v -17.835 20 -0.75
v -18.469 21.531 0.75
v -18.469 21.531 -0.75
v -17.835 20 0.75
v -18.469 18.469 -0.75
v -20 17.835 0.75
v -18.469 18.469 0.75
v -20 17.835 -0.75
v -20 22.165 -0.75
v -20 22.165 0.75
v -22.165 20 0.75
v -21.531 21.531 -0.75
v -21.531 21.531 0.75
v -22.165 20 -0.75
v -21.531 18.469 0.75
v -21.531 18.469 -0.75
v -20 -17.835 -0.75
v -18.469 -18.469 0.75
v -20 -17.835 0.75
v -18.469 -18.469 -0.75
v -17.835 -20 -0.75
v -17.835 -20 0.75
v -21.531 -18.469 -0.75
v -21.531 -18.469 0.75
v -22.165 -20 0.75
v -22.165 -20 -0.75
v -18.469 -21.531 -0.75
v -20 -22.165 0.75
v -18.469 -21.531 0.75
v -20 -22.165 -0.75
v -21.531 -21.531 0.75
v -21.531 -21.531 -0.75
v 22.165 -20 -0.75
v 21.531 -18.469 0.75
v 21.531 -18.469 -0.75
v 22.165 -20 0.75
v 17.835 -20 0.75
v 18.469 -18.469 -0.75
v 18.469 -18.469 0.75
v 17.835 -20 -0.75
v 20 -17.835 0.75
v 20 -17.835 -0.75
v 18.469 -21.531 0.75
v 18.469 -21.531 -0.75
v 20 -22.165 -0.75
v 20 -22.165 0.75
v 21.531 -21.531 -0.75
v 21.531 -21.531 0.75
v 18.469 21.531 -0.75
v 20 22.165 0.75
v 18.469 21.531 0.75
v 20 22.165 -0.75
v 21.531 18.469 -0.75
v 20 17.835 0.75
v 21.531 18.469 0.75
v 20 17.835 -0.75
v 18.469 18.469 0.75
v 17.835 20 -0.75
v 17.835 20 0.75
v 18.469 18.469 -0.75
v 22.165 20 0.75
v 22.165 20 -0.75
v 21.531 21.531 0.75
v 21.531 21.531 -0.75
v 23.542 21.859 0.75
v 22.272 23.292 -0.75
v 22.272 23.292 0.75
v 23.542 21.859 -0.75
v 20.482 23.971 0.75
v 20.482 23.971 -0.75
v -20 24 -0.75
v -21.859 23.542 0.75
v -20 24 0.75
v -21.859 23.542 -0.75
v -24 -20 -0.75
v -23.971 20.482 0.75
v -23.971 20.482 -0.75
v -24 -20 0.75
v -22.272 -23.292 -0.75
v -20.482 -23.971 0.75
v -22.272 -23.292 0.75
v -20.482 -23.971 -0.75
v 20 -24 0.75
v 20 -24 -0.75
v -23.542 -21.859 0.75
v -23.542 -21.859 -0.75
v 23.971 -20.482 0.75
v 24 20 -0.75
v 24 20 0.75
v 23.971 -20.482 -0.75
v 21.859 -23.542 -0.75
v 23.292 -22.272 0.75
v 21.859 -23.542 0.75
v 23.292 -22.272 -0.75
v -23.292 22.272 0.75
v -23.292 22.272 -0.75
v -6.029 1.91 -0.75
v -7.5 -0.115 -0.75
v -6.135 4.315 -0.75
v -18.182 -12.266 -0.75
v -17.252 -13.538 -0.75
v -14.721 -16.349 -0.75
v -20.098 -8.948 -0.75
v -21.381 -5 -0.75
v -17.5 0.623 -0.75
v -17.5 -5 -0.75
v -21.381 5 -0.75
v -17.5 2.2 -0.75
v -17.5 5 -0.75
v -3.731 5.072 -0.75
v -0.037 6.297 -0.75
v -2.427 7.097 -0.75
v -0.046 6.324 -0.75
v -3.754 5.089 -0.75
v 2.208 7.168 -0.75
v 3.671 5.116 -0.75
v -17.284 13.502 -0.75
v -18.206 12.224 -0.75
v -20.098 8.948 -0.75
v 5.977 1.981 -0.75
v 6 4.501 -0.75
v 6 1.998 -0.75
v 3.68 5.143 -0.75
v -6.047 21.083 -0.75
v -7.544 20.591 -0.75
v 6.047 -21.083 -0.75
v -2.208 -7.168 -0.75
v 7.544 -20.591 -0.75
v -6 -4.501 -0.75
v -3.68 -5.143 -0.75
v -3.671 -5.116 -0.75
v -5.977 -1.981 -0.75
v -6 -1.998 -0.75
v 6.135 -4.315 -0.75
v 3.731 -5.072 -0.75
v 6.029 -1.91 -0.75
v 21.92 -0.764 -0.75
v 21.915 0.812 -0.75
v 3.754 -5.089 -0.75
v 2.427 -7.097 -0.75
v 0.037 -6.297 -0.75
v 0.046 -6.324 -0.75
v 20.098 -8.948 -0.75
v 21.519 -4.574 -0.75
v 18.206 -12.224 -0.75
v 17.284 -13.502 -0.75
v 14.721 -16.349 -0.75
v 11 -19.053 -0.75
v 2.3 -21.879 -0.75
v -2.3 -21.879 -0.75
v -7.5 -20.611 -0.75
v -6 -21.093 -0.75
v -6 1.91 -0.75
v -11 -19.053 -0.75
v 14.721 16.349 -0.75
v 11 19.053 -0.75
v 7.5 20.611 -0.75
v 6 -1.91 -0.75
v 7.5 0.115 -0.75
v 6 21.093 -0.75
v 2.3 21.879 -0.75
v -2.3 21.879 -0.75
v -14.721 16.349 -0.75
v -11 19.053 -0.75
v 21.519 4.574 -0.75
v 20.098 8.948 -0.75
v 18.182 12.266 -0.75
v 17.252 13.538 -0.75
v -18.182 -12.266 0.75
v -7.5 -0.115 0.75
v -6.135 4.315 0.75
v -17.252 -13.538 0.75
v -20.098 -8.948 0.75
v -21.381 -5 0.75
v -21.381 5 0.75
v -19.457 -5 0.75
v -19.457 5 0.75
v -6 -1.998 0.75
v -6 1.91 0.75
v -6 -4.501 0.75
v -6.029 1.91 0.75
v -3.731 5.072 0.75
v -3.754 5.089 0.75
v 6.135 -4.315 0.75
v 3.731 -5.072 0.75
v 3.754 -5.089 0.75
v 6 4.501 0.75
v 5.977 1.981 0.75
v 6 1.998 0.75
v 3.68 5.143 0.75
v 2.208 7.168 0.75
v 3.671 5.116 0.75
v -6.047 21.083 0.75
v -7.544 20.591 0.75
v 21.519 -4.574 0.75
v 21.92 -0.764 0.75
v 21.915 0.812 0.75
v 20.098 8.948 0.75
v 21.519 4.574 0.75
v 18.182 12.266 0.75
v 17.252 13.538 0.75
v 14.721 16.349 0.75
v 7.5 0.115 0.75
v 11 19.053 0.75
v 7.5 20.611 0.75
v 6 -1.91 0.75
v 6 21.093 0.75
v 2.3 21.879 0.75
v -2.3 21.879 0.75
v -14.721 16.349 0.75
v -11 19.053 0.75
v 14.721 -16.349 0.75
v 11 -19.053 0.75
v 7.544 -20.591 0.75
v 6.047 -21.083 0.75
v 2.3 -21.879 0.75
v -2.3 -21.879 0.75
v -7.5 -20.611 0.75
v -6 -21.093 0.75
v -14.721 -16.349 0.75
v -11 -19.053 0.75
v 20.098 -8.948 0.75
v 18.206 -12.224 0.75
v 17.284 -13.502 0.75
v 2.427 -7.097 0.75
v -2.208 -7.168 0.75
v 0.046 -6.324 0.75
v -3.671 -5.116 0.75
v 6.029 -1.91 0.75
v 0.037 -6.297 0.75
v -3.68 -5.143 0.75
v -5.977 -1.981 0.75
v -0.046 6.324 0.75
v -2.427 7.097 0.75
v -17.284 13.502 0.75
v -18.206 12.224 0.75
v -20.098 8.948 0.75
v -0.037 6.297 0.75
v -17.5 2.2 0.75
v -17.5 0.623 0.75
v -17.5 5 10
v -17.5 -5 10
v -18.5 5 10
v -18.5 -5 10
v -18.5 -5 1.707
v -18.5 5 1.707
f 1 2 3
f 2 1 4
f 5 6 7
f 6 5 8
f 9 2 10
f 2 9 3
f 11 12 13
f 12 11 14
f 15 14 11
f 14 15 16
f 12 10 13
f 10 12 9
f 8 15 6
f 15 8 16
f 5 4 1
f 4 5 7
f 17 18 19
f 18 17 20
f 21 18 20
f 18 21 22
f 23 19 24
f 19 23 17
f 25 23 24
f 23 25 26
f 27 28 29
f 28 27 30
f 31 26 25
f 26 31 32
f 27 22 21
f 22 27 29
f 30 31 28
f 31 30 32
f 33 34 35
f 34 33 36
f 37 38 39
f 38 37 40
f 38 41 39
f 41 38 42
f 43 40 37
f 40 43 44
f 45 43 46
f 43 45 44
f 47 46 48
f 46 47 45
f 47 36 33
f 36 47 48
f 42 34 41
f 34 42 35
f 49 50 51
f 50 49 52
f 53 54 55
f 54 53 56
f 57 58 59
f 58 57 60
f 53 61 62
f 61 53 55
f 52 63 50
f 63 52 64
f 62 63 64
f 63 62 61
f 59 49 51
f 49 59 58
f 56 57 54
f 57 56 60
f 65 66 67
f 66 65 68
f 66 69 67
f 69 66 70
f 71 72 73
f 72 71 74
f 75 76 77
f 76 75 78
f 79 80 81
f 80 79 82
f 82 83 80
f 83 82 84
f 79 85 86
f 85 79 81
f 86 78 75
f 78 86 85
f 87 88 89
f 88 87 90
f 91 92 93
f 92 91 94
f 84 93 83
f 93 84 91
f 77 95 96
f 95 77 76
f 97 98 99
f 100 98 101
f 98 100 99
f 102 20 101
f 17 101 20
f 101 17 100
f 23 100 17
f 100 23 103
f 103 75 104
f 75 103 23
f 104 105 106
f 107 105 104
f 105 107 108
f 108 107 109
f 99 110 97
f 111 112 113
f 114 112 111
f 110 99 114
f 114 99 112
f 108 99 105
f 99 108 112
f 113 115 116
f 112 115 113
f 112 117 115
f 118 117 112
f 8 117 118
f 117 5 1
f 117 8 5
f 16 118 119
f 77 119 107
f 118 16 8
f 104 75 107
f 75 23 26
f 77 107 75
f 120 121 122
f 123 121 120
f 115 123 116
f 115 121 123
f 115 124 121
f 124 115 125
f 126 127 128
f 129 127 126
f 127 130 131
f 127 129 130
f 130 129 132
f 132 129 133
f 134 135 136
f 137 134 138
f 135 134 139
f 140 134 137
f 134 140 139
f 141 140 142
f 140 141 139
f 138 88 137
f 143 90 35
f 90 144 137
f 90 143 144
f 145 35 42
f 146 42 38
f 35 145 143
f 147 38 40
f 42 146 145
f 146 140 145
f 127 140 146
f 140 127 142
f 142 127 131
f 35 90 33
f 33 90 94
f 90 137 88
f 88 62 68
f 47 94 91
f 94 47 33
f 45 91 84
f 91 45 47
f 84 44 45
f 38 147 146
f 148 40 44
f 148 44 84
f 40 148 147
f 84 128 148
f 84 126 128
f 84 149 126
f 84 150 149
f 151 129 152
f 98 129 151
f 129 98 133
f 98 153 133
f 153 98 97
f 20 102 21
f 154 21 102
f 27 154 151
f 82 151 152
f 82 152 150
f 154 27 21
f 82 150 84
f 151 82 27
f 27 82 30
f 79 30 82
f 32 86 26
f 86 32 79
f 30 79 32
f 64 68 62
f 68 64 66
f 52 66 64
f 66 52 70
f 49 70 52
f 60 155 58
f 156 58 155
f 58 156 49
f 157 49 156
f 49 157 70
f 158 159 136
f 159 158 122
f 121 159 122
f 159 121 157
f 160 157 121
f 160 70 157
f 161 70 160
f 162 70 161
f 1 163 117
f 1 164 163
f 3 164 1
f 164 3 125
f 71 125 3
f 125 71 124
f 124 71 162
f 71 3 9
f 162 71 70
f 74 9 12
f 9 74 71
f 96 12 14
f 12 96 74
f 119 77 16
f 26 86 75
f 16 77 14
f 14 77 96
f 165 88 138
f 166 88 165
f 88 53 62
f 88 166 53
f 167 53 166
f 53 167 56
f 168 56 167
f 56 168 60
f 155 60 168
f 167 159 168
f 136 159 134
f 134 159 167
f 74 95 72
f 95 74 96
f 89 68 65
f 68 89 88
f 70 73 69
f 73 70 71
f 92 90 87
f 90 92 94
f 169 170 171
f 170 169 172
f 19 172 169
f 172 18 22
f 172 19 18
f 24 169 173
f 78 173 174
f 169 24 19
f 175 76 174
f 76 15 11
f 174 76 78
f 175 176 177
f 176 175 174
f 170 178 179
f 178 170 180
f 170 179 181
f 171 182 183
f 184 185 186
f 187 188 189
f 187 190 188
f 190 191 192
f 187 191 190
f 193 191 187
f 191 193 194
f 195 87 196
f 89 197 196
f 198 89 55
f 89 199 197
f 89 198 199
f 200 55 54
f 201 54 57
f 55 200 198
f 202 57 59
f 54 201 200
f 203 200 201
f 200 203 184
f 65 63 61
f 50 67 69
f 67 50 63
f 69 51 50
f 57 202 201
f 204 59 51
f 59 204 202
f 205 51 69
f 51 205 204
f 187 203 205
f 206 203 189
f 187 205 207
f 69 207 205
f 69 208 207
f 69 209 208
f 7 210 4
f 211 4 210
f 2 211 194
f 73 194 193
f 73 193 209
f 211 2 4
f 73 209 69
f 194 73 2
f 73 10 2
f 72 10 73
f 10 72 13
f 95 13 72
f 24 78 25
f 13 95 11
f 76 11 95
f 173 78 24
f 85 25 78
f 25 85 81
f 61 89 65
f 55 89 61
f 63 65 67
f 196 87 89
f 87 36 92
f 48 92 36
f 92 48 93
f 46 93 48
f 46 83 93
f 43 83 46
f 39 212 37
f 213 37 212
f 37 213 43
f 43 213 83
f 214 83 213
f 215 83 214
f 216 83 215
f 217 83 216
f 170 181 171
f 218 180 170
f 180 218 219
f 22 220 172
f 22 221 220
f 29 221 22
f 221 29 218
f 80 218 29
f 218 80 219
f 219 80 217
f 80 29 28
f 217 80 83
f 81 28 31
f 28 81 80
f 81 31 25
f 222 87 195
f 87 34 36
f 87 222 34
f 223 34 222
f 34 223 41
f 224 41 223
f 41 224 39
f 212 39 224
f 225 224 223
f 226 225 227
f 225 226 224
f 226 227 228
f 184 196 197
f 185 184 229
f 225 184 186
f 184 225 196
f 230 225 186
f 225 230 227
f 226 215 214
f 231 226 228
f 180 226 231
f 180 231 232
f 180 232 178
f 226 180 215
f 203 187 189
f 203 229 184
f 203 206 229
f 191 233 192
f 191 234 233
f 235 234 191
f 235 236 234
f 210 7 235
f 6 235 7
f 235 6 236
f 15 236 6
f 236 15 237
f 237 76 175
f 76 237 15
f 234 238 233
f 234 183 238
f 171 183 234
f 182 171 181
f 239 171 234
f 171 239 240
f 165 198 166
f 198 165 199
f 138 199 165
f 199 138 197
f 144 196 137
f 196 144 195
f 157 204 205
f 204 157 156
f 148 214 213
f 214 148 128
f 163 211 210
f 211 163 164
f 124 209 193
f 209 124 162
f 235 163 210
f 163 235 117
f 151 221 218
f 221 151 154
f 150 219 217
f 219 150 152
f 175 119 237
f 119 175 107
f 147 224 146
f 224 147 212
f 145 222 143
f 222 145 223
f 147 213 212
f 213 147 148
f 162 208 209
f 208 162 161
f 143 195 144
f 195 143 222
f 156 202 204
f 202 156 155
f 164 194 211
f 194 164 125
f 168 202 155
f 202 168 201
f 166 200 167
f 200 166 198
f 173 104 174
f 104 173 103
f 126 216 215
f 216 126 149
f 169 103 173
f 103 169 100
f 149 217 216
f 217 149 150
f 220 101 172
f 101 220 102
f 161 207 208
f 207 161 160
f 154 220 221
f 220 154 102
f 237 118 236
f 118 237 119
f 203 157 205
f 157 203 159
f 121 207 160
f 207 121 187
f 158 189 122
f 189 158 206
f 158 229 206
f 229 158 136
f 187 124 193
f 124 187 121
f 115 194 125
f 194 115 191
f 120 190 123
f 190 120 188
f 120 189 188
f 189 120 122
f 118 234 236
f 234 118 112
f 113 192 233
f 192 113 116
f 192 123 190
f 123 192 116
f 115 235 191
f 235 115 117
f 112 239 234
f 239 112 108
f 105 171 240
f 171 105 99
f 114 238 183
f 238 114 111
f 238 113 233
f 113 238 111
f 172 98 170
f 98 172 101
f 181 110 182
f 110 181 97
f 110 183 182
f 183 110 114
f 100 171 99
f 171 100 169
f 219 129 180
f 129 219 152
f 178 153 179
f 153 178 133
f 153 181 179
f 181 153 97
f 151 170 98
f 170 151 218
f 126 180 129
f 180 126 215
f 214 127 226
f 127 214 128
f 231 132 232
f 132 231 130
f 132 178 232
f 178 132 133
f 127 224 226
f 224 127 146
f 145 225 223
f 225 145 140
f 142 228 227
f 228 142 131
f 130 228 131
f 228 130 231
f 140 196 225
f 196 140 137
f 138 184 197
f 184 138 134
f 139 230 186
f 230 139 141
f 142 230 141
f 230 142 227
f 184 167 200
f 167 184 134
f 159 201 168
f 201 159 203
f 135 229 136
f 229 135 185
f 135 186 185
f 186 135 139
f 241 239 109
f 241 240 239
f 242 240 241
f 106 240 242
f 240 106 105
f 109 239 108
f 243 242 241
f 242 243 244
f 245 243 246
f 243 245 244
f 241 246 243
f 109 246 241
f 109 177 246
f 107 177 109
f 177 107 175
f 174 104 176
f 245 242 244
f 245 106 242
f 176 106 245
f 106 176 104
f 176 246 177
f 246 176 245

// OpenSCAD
// file: config.scad
// modules
module_body_size = [25, 50, 10];
module_mount_edge_offset = 5;
module_level_bolt_size = 4;
module_level_spring_diameter = 8;
module_level_bolt_spacing = module_body_size[1] - 2*module_mount_edge_offset;
module_clamp_bolt_size = 4;
module_clamp_bolt_head_height = 2.5;

// main body
body_wall_thickness = 5;
body_size = [3*module_body_size[0]+2*body_wall_thickness+1, module_body_size[1]+2*body_wall_thickness+1, 55];
carriage_mount_hole_spacing=22.5;	// i3 rework standard
carriage_screw_size = 4;
carriage_screw_head_height = 2.5;
hotend_fan_output = 49;
hotend_fan_screw_spacing = 40;
hotend_fan_screw_size = 4;
blower_screw_spacing = 40;
blower_screw_size = 4;

// misc
body_chamfer = 2;
layer_height = 0.3;
tolerance = 0.1;
pf = 0.1;  // preview fix for z-buffer tearing on cuts
// main file
use <MCAD/polyholes.scad>
include <config.scad>

thickness = 1.5;
flag_size = [1, 10, 10];
flag_y_offset_from_x_carriage = 12.5;
spines=10;
spine_offset=6;
spine_rotation=0;
size = blower_screw_spacing + blower_screw_size;

exterior();
interior();
flag();

module exterior()
{
	difference()
	{
		hull()
		{
			for(r=[1:4])
			{
				rotate([0, 0, r*90])
				{
					translate([blower_screw_spacing/2, blower_screw_spacing/2, 0])
					{
						cylinder(d=2*blower_screw_size, h=thickness, center=true);
					}
				}
			}
		}
		
		cylinder(d=size, h=thickness+pf, center=true);
		
		for(r=[1:4])
		{
			rotate([0, 0, r*90])
			{
				translate([blower_screw_spacing/2, blower_screw_spacing/2, 0])
				{
					translate([0, 0, -(body_wall_thickness+pf)/2])
					{
						polyhole(body_wall_thickness+pf, blower_screw_size);
					}
				}
			}
		}
	}
}

module interior()
{
	holeradius=size/2;

	translate([0, 0, -thickness/2])
	{
		for(i=[0:spines-1])
		{
			rotate(a=[0,0,i*(360.0/spines)+spine_rotation]) 
			{
				translate([spine_offset,-spine_offset/3.141,0])
				{
					cube([thickness,holeradius+(spine_offset/3.141),thickness]);
				}
			}
		}
	}
}

module flag()
{
	flag_x_offset = body_size[1]/2 - flag_y_offset_from_x_carriage;
	translate([-flag_x_offset, 0, 0])
	{
		translate([0, 0, flag_size[2]/2])
		{
			cube(flag_size, true);
		}
		
		translate([-2.5 + flag_size[0]/2, 0, 0])
		{
			cube([5, flag_size[1], thickness], true);
		}
		
		translate([-0.75, 0, 0.75])
		{
			rotate([0, 45, 0])
			{
				cube([1, flag_size[1], 2], true);
			}
		}
	}
}
